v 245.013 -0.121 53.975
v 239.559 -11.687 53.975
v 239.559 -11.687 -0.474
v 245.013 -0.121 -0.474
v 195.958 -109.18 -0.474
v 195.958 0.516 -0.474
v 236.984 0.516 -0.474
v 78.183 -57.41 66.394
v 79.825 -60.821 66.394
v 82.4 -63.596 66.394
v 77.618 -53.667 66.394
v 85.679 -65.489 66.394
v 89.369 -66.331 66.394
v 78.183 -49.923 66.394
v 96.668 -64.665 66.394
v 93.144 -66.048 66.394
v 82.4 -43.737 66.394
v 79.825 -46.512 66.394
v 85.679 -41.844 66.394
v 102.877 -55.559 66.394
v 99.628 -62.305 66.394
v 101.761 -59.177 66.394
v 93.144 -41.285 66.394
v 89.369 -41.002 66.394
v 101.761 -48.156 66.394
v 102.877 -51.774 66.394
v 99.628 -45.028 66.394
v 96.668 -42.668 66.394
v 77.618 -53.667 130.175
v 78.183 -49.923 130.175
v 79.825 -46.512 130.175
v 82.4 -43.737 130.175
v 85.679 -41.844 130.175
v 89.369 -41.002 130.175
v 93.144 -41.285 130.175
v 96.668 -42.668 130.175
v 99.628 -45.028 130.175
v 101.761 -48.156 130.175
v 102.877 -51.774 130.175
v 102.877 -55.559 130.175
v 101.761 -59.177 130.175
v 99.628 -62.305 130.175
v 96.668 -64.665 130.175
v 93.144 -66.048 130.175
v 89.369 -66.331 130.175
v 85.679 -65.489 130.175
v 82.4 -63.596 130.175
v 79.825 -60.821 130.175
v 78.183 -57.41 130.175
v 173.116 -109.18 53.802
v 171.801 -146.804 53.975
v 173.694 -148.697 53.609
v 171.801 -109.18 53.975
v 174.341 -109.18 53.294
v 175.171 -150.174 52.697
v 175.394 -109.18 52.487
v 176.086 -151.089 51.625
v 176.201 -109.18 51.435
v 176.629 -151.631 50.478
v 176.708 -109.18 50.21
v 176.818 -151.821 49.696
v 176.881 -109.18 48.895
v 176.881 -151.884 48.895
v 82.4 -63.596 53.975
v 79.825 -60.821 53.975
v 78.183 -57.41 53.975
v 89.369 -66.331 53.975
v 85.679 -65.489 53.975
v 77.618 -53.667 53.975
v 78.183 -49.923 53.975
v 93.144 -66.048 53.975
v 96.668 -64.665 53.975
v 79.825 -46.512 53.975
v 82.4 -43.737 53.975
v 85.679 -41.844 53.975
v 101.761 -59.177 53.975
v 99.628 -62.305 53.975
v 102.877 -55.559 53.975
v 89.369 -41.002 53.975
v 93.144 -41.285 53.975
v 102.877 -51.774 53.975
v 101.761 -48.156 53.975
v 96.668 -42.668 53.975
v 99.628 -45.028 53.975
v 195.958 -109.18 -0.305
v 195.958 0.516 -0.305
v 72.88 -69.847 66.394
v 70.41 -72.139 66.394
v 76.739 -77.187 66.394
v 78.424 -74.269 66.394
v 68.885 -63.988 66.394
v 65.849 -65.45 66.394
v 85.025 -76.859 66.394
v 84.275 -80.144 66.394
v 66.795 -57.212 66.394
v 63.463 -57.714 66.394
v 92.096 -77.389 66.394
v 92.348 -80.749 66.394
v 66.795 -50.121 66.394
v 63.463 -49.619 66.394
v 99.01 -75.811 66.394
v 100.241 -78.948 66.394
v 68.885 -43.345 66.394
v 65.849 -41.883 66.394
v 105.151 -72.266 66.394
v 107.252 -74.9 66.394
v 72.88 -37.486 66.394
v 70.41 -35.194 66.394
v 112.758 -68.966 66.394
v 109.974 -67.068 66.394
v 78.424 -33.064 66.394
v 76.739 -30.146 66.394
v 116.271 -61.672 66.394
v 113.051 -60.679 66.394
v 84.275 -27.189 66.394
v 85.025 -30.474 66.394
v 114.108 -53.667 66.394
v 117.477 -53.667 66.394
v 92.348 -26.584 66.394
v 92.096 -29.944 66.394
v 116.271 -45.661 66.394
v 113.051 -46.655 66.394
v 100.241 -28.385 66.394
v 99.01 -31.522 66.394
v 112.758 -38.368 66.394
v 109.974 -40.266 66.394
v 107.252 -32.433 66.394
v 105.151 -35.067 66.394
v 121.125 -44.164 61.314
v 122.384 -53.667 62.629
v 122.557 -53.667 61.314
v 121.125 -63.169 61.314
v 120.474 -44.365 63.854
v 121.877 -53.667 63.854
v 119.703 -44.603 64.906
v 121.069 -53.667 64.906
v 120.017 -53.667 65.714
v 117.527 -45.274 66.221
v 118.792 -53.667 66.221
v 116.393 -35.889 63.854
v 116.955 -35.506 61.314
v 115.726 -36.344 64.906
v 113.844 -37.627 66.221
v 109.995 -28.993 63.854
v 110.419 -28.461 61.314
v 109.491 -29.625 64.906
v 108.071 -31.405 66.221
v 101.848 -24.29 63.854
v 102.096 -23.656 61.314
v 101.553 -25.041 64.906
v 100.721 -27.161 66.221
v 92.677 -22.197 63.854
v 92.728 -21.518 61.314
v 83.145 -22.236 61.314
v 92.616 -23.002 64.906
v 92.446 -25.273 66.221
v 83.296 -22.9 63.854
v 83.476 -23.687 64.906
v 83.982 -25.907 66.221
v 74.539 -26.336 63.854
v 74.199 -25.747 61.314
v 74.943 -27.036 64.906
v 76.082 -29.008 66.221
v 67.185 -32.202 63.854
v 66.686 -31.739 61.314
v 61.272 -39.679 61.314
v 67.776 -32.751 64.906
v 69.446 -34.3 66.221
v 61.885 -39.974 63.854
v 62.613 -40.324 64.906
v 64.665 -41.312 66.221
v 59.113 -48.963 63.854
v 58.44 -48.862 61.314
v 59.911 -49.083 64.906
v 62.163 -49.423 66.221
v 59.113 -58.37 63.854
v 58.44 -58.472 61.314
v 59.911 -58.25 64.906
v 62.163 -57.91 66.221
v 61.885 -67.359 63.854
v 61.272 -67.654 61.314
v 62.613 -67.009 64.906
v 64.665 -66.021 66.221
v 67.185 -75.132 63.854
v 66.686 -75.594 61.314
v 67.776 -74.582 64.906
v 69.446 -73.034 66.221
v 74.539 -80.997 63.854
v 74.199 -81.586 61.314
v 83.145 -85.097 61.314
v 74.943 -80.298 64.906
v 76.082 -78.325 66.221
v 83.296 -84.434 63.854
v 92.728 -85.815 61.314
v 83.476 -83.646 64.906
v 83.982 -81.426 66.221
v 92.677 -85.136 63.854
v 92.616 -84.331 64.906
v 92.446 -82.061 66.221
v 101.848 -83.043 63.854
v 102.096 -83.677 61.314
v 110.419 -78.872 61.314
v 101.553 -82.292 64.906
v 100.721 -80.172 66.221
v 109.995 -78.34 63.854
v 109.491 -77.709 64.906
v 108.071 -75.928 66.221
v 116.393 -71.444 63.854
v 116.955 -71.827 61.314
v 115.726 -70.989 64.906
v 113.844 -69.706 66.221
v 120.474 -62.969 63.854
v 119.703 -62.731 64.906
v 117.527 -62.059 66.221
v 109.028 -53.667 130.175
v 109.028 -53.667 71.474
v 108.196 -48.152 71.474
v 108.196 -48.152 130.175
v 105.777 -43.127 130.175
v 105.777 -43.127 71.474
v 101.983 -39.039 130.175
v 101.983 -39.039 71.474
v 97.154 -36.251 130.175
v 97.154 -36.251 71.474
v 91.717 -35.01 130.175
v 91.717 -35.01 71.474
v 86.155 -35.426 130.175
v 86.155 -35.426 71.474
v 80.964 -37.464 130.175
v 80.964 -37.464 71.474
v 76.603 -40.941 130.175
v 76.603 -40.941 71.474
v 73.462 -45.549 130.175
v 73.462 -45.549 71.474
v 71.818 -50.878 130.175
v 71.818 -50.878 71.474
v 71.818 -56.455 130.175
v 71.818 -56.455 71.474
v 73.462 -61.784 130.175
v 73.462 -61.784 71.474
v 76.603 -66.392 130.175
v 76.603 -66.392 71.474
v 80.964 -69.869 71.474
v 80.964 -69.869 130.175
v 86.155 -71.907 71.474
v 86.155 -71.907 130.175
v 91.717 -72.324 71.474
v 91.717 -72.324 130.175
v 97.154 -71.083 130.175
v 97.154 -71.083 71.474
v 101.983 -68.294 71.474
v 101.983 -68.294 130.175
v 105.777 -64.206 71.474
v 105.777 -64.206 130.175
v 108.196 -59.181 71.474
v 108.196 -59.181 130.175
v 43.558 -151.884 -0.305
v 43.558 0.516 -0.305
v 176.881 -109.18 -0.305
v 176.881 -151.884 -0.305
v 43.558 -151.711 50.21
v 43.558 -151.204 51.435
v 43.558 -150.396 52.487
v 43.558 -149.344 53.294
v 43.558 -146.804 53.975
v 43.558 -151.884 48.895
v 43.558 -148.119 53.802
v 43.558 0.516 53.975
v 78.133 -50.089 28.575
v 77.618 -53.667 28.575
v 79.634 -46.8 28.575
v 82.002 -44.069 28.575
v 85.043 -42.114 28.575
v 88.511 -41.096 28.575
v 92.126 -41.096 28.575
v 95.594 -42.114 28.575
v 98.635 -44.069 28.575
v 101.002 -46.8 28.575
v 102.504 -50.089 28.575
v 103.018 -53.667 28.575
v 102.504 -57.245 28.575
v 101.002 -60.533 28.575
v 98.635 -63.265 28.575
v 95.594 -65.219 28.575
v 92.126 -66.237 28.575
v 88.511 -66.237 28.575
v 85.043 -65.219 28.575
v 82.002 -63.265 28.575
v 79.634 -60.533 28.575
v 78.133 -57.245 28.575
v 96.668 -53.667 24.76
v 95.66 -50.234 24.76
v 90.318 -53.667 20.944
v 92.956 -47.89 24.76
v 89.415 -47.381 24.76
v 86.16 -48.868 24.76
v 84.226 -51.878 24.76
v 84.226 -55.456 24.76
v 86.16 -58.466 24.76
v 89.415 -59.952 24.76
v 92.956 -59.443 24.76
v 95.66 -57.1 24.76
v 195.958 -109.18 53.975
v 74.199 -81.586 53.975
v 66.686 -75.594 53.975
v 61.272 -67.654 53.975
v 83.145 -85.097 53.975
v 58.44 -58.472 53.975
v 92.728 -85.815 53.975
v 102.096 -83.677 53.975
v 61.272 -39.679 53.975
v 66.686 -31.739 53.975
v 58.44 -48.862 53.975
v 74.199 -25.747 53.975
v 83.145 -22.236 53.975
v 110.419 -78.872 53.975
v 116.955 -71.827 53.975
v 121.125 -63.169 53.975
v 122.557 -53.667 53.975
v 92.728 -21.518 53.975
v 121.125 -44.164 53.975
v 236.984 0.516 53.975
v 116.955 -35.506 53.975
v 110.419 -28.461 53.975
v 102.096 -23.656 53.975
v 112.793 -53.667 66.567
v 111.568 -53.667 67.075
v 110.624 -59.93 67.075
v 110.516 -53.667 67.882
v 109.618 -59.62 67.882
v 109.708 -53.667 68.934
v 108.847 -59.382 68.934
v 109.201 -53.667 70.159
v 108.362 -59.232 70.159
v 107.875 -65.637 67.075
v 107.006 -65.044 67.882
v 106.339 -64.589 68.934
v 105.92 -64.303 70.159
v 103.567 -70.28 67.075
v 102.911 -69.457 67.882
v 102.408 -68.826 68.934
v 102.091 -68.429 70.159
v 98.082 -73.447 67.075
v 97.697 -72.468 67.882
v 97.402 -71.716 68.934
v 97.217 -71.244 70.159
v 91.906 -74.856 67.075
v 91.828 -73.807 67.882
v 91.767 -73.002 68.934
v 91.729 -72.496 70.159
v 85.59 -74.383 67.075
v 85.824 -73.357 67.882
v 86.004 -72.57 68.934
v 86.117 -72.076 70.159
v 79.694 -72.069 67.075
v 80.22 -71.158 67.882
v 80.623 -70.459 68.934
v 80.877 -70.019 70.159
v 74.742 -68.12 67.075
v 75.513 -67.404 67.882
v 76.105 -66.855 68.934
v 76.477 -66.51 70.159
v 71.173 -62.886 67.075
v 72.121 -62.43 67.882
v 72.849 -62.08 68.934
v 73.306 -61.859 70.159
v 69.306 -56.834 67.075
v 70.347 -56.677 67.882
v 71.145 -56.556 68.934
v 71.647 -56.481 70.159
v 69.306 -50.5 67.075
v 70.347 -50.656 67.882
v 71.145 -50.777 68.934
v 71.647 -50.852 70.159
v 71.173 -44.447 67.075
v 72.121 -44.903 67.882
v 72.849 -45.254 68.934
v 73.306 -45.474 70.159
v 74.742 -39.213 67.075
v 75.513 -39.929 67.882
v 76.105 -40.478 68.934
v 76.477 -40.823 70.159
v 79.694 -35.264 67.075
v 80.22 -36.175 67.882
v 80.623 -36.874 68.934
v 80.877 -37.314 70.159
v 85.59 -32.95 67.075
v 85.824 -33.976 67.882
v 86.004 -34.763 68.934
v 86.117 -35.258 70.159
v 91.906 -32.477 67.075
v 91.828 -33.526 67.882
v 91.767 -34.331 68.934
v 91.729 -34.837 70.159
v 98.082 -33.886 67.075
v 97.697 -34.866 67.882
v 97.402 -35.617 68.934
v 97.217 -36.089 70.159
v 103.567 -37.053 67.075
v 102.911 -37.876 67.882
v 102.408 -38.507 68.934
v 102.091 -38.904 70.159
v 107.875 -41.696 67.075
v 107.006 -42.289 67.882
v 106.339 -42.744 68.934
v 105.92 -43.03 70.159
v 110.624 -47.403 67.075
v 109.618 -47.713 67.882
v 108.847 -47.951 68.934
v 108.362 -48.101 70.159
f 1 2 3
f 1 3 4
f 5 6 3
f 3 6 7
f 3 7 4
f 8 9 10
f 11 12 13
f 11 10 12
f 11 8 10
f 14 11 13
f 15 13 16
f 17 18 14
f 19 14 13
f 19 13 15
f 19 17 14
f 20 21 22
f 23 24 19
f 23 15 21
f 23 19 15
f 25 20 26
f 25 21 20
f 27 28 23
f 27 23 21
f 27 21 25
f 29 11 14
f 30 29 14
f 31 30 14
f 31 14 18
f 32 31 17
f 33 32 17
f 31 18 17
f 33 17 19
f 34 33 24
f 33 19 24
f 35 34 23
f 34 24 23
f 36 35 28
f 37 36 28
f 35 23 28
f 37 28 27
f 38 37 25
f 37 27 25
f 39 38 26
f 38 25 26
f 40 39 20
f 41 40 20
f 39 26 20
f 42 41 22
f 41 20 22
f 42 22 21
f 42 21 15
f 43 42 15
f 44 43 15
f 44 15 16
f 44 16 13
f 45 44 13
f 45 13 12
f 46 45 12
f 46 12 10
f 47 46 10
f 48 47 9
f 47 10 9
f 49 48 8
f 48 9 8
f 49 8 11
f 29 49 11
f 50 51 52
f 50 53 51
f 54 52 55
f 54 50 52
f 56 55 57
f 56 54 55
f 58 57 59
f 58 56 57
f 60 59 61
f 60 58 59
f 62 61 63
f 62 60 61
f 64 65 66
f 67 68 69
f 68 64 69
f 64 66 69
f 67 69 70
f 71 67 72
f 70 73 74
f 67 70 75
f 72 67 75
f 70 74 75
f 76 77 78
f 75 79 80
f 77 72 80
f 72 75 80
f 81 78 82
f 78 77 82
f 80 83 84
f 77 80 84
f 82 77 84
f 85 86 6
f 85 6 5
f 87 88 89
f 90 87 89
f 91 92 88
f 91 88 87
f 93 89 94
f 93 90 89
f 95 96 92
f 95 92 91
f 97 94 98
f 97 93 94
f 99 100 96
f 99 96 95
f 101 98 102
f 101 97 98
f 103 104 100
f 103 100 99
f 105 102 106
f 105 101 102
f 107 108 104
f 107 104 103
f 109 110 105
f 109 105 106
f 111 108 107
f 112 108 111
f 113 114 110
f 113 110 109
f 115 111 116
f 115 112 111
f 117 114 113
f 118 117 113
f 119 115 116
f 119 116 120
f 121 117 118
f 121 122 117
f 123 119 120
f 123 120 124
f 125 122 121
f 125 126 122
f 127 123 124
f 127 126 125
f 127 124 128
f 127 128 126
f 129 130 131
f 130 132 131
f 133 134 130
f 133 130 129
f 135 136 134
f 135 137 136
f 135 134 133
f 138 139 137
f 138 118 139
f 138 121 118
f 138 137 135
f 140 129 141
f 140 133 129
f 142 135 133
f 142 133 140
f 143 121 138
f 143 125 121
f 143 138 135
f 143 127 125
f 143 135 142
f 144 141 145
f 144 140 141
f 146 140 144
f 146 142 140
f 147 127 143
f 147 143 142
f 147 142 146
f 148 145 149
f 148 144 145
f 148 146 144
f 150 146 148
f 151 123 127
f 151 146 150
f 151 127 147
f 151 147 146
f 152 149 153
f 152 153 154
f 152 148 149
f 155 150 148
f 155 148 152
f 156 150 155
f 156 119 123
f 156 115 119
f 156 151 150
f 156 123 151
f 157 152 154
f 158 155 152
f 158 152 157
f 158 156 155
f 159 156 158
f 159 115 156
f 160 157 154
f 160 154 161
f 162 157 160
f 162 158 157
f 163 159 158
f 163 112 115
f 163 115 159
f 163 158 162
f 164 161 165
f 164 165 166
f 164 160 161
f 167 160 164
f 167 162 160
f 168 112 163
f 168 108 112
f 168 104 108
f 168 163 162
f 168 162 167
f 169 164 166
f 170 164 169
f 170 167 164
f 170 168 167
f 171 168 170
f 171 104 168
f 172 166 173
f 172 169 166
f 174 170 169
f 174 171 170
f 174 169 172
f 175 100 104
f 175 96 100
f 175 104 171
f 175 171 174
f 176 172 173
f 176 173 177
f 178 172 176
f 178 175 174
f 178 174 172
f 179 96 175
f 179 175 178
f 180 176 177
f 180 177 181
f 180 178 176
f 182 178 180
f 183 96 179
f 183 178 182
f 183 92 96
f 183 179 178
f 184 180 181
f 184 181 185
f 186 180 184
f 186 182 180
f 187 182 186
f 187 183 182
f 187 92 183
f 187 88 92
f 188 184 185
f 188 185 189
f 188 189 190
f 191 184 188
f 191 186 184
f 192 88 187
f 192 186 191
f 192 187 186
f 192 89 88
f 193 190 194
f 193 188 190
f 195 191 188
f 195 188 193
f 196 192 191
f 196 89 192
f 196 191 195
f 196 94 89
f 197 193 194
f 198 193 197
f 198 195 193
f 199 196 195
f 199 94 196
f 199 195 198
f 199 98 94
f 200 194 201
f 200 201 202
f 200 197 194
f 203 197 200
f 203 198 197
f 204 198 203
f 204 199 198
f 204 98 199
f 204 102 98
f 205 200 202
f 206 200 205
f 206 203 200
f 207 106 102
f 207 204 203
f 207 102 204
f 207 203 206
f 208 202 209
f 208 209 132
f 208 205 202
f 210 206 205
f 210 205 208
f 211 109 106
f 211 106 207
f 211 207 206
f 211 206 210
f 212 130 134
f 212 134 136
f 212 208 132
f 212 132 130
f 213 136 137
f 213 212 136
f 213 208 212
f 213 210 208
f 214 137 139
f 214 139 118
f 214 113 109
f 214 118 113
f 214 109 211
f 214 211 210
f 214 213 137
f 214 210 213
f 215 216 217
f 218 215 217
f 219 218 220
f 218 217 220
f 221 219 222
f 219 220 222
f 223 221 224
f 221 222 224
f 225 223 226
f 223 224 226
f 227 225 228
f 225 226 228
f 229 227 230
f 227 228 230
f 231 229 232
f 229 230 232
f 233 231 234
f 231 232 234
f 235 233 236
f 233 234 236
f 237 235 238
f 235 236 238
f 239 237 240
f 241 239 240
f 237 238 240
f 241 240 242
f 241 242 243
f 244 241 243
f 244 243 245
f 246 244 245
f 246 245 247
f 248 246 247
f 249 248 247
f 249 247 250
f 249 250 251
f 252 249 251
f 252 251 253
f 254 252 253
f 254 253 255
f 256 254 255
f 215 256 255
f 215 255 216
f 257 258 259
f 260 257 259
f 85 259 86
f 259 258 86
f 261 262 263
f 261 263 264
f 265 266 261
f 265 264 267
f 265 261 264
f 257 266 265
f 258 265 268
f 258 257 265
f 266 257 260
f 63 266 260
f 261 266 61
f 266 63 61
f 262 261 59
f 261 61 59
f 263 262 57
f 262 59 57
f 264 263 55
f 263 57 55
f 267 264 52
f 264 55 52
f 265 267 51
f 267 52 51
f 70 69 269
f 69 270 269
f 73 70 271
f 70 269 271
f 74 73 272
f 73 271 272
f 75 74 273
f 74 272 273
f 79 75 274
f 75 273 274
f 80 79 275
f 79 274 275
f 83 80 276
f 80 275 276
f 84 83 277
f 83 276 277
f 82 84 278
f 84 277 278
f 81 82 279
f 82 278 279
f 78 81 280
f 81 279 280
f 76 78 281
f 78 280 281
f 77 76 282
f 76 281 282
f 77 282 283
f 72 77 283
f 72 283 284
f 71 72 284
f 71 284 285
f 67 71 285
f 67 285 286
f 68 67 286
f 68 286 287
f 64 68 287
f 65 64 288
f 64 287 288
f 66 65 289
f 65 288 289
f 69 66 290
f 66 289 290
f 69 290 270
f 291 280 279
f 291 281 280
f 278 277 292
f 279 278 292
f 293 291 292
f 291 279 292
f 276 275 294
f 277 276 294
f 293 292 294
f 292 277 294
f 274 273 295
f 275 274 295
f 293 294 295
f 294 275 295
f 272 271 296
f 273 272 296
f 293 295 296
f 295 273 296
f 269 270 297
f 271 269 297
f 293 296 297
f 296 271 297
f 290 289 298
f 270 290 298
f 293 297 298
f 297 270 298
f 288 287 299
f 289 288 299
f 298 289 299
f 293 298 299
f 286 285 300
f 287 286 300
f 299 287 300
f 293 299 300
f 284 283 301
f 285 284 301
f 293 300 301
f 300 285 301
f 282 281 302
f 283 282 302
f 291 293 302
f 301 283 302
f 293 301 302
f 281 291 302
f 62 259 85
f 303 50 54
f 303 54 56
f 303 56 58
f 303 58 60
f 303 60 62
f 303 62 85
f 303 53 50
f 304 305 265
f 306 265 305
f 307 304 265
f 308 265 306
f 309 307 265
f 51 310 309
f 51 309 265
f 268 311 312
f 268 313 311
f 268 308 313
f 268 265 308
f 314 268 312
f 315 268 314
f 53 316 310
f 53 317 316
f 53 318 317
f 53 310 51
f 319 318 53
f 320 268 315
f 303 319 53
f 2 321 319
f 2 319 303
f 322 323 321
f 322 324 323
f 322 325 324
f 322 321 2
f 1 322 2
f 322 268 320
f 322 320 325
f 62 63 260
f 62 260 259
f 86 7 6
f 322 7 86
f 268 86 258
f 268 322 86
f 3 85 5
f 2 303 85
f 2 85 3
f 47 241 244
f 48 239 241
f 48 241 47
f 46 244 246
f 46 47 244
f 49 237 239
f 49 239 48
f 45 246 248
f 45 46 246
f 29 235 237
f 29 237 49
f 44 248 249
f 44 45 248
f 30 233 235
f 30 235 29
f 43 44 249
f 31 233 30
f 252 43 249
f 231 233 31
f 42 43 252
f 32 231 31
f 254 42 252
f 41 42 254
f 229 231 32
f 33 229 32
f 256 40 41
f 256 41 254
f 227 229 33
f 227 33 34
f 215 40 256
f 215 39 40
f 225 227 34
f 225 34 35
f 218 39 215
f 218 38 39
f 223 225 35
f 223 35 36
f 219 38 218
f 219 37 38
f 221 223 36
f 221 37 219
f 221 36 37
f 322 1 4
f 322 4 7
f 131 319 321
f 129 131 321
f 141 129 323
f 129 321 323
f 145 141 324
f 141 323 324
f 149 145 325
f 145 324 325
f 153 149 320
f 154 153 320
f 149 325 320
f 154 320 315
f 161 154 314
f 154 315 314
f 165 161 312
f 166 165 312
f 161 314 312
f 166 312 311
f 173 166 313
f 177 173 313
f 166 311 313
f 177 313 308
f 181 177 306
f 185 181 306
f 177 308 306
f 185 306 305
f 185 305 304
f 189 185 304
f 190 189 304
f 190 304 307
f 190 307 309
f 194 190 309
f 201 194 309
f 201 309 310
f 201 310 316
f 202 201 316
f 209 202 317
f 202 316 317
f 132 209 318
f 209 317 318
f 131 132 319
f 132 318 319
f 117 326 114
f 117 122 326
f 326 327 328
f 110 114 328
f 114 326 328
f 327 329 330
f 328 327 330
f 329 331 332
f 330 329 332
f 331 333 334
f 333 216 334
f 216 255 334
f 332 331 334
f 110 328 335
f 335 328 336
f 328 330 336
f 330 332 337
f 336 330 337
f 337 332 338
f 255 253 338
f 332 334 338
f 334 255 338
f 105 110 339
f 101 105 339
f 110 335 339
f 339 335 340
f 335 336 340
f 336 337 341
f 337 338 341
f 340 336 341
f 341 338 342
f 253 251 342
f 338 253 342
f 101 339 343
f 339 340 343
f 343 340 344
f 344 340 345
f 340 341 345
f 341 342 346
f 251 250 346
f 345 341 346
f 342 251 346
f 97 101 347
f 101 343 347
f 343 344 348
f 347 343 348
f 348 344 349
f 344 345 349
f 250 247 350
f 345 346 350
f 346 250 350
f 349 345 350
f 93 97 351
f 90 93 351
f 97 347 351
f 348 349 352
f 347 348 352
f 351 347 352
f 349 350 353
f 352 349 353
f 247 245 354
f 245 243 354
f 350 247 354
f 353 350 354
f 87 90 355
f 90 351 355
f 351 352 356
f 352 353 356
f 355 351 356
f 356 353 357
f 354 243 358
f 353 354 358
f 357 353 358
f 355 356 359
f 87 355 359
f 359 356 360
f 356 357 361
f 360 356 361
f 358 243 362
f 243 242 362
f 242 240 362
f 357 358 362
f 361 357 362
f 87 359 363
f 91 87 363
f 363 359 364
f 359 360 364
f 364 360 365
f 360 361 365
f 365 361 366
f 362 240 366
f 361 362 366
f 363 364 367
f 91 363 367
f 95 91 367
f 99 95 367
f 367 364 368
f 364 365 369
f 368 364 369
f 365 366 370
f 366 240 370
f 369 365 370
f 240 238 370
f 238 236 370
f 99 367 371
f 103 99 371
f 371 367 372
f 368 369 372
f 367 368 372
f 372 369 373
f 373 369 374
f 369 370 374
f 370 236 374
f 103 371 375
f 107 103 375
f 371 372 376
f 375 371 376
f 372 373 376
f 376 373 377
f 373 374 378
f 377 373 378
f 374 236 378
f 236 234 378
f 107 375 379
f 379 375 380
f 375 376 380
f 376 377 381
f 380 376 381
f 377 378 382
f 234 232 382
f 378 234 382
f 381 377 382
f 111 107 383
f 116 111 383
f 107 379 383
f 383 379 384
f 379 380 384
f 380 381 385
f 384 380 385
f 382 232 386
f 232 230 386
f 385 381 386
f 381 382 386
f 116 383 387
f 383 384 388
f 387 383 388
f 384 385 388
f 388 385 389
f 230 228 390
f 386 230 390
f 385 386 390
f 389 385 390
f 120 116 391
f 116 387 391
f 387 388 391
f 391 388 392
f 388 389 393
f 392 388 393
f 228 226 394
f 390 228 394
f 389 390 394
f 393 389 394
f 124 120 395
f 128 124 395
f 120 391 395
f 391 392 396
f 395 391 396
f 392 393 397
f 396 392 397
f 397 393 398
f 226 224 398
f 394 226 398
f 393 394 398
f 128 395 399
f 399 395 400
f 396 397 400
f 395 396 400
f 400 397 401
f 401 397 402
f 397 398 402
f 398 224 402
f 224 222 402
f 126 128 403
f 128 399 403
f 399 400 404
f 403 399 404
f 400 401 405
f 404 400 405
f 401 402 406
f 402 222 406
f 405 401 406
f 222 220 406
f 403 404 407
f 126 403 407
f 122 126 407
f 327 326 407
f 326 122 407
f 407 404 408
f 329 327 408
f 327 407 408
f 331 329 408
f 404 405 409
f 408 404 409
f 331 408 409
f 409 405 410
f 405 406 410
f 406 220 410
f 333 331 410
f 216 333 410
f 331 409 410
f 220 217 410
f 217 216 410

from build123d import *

# Parameters (mm, degrees)
F0_W      = 177.8
F0_H      = 152.4
F1_DEPTH  = 53.975
F2_W      = 44.4769412279
F2_H      = 42.7047908306
F3_DEPTH  = 57.28848
F4_R      = 5.08
F5_DEPTH  = 25.4
F7_DEPTH  = 53.071
F8_R      = 18.7092621325
F9_DEPTH  = 76.2
F11_D     = 25.4
F11_DEPTH = 101.6
F11_TIP   = 7.6309298617
F12_R     = 32.2387341202
F13_DEPTH = 12.41914
F14_R     = 5.08
F15_DEPTH = 0.30507
F16_DEPTH = 1.0725


with BuildPart() as f1:
    # F0 (on Top) → F1 (new body)
    with BuildSketch(Plane.XY):
        with Locations((132.4584333658, -75.6843322992)):
            Rectangle(F0_W, F0_H)
    extrude(amount=F1_DEPTH)

    # F2 (on face) → F3 (cut)
    with BuildSketch(Plane.XY.offset(53.975)):
        with Locations((199.1199627519, -130.5319368839)):
            Rectangle(F2_W, F2_H)
    extrude(amount=-F3_DEPTH, mode=Mode.SUBTRACT)

    # F4
    f4_edges = [f1.edges().sort_by_distance(p)[0] for p in [
        (176.881492, -130.531937, 53.975),
        (110.219963, -151.884332, 53.975),
    ]]
    fillet(f4_edges, radius=F4_R)

    # F5 (cut): a face of the model
    f5_faces = [f1.faces().sort_by_distance(p)[0] for p in [
        (221.3584333658, -54.3319368839, 26.9875),
    ]]
    extrude(f5_faces, amount=-F5_DEPTH, mode=Mode.SUBTRACT)

    # F6 (on face) → F7 (join)
    with BuildSketch(Plane.XY.offset(53.975)):
        Polygon((195.9584333658, 0.5156677008), (195.9584333658, -109.1795414686), (239.5593672991, -11.6872834042), (245.01273036, -0.1214179429), (236.9844764471, 0.5156677008), align=None)
    extrude(amount=-F7_DEPTH)

    # F8 (on face) → F9 (join)
    with BuildSketch(Plane.XY.offset(53.975)):
        with Locations((90.3183594346, -53.666587919)):
            Circle(F8_R)
    extrude(amount=F9_DEPTH)

    # F11
    with Locations(Plane.XY.offset(130.175)):
        with Locations((90.3183594346, -53.666587919)):
            Hole(F11_D / 2, depth=F11_DEPTH)
            with Locations((0, 0, -(F11_DEPTH + F11_TIP / 2))):  # 118° drill point
                Cone(0, F11_D / 2, F11_TIP, mode=Mode.SUBTRACT)

    # F12 (on face) → F13 (join)
    with BuildSketch(Plane.XY.offset(53.975)):
        with Locations((90.3183594346, -53.666587919)):
            Circle(F12_R)
    extrude(amount=F13_DEPTH)

    # F14
    f14_edges = [f1.edges().sort_by_distance(p)[0] for p in [
        (58.079625, -53.666588, 66.39414),
        (71.609097, -53.666588, 66.39414),
    ]]
    fillet(f14_edges, radius=F14_R)

    # F15 (add): faces of the model
    f15_faces = [f1.faces().sort_by_distance(p)[0] for p in [
        (212.3023430426, -36.0634157102, 0.904),
        (117.3351859078, -73.6905388833, 0),
    ]]
    extrude(f15_faces, amount=F15_DEPTH)

    # F16 (add): a face of the model
    f16_faces = [f1.faces().sort_by_distance(p)[0] for p in [
        (212.3023430426, -36.0634157102, 0.59893),
    ]]
    extrude(f16_faces, amount=F16_DEPTH)


solid = f1.part
